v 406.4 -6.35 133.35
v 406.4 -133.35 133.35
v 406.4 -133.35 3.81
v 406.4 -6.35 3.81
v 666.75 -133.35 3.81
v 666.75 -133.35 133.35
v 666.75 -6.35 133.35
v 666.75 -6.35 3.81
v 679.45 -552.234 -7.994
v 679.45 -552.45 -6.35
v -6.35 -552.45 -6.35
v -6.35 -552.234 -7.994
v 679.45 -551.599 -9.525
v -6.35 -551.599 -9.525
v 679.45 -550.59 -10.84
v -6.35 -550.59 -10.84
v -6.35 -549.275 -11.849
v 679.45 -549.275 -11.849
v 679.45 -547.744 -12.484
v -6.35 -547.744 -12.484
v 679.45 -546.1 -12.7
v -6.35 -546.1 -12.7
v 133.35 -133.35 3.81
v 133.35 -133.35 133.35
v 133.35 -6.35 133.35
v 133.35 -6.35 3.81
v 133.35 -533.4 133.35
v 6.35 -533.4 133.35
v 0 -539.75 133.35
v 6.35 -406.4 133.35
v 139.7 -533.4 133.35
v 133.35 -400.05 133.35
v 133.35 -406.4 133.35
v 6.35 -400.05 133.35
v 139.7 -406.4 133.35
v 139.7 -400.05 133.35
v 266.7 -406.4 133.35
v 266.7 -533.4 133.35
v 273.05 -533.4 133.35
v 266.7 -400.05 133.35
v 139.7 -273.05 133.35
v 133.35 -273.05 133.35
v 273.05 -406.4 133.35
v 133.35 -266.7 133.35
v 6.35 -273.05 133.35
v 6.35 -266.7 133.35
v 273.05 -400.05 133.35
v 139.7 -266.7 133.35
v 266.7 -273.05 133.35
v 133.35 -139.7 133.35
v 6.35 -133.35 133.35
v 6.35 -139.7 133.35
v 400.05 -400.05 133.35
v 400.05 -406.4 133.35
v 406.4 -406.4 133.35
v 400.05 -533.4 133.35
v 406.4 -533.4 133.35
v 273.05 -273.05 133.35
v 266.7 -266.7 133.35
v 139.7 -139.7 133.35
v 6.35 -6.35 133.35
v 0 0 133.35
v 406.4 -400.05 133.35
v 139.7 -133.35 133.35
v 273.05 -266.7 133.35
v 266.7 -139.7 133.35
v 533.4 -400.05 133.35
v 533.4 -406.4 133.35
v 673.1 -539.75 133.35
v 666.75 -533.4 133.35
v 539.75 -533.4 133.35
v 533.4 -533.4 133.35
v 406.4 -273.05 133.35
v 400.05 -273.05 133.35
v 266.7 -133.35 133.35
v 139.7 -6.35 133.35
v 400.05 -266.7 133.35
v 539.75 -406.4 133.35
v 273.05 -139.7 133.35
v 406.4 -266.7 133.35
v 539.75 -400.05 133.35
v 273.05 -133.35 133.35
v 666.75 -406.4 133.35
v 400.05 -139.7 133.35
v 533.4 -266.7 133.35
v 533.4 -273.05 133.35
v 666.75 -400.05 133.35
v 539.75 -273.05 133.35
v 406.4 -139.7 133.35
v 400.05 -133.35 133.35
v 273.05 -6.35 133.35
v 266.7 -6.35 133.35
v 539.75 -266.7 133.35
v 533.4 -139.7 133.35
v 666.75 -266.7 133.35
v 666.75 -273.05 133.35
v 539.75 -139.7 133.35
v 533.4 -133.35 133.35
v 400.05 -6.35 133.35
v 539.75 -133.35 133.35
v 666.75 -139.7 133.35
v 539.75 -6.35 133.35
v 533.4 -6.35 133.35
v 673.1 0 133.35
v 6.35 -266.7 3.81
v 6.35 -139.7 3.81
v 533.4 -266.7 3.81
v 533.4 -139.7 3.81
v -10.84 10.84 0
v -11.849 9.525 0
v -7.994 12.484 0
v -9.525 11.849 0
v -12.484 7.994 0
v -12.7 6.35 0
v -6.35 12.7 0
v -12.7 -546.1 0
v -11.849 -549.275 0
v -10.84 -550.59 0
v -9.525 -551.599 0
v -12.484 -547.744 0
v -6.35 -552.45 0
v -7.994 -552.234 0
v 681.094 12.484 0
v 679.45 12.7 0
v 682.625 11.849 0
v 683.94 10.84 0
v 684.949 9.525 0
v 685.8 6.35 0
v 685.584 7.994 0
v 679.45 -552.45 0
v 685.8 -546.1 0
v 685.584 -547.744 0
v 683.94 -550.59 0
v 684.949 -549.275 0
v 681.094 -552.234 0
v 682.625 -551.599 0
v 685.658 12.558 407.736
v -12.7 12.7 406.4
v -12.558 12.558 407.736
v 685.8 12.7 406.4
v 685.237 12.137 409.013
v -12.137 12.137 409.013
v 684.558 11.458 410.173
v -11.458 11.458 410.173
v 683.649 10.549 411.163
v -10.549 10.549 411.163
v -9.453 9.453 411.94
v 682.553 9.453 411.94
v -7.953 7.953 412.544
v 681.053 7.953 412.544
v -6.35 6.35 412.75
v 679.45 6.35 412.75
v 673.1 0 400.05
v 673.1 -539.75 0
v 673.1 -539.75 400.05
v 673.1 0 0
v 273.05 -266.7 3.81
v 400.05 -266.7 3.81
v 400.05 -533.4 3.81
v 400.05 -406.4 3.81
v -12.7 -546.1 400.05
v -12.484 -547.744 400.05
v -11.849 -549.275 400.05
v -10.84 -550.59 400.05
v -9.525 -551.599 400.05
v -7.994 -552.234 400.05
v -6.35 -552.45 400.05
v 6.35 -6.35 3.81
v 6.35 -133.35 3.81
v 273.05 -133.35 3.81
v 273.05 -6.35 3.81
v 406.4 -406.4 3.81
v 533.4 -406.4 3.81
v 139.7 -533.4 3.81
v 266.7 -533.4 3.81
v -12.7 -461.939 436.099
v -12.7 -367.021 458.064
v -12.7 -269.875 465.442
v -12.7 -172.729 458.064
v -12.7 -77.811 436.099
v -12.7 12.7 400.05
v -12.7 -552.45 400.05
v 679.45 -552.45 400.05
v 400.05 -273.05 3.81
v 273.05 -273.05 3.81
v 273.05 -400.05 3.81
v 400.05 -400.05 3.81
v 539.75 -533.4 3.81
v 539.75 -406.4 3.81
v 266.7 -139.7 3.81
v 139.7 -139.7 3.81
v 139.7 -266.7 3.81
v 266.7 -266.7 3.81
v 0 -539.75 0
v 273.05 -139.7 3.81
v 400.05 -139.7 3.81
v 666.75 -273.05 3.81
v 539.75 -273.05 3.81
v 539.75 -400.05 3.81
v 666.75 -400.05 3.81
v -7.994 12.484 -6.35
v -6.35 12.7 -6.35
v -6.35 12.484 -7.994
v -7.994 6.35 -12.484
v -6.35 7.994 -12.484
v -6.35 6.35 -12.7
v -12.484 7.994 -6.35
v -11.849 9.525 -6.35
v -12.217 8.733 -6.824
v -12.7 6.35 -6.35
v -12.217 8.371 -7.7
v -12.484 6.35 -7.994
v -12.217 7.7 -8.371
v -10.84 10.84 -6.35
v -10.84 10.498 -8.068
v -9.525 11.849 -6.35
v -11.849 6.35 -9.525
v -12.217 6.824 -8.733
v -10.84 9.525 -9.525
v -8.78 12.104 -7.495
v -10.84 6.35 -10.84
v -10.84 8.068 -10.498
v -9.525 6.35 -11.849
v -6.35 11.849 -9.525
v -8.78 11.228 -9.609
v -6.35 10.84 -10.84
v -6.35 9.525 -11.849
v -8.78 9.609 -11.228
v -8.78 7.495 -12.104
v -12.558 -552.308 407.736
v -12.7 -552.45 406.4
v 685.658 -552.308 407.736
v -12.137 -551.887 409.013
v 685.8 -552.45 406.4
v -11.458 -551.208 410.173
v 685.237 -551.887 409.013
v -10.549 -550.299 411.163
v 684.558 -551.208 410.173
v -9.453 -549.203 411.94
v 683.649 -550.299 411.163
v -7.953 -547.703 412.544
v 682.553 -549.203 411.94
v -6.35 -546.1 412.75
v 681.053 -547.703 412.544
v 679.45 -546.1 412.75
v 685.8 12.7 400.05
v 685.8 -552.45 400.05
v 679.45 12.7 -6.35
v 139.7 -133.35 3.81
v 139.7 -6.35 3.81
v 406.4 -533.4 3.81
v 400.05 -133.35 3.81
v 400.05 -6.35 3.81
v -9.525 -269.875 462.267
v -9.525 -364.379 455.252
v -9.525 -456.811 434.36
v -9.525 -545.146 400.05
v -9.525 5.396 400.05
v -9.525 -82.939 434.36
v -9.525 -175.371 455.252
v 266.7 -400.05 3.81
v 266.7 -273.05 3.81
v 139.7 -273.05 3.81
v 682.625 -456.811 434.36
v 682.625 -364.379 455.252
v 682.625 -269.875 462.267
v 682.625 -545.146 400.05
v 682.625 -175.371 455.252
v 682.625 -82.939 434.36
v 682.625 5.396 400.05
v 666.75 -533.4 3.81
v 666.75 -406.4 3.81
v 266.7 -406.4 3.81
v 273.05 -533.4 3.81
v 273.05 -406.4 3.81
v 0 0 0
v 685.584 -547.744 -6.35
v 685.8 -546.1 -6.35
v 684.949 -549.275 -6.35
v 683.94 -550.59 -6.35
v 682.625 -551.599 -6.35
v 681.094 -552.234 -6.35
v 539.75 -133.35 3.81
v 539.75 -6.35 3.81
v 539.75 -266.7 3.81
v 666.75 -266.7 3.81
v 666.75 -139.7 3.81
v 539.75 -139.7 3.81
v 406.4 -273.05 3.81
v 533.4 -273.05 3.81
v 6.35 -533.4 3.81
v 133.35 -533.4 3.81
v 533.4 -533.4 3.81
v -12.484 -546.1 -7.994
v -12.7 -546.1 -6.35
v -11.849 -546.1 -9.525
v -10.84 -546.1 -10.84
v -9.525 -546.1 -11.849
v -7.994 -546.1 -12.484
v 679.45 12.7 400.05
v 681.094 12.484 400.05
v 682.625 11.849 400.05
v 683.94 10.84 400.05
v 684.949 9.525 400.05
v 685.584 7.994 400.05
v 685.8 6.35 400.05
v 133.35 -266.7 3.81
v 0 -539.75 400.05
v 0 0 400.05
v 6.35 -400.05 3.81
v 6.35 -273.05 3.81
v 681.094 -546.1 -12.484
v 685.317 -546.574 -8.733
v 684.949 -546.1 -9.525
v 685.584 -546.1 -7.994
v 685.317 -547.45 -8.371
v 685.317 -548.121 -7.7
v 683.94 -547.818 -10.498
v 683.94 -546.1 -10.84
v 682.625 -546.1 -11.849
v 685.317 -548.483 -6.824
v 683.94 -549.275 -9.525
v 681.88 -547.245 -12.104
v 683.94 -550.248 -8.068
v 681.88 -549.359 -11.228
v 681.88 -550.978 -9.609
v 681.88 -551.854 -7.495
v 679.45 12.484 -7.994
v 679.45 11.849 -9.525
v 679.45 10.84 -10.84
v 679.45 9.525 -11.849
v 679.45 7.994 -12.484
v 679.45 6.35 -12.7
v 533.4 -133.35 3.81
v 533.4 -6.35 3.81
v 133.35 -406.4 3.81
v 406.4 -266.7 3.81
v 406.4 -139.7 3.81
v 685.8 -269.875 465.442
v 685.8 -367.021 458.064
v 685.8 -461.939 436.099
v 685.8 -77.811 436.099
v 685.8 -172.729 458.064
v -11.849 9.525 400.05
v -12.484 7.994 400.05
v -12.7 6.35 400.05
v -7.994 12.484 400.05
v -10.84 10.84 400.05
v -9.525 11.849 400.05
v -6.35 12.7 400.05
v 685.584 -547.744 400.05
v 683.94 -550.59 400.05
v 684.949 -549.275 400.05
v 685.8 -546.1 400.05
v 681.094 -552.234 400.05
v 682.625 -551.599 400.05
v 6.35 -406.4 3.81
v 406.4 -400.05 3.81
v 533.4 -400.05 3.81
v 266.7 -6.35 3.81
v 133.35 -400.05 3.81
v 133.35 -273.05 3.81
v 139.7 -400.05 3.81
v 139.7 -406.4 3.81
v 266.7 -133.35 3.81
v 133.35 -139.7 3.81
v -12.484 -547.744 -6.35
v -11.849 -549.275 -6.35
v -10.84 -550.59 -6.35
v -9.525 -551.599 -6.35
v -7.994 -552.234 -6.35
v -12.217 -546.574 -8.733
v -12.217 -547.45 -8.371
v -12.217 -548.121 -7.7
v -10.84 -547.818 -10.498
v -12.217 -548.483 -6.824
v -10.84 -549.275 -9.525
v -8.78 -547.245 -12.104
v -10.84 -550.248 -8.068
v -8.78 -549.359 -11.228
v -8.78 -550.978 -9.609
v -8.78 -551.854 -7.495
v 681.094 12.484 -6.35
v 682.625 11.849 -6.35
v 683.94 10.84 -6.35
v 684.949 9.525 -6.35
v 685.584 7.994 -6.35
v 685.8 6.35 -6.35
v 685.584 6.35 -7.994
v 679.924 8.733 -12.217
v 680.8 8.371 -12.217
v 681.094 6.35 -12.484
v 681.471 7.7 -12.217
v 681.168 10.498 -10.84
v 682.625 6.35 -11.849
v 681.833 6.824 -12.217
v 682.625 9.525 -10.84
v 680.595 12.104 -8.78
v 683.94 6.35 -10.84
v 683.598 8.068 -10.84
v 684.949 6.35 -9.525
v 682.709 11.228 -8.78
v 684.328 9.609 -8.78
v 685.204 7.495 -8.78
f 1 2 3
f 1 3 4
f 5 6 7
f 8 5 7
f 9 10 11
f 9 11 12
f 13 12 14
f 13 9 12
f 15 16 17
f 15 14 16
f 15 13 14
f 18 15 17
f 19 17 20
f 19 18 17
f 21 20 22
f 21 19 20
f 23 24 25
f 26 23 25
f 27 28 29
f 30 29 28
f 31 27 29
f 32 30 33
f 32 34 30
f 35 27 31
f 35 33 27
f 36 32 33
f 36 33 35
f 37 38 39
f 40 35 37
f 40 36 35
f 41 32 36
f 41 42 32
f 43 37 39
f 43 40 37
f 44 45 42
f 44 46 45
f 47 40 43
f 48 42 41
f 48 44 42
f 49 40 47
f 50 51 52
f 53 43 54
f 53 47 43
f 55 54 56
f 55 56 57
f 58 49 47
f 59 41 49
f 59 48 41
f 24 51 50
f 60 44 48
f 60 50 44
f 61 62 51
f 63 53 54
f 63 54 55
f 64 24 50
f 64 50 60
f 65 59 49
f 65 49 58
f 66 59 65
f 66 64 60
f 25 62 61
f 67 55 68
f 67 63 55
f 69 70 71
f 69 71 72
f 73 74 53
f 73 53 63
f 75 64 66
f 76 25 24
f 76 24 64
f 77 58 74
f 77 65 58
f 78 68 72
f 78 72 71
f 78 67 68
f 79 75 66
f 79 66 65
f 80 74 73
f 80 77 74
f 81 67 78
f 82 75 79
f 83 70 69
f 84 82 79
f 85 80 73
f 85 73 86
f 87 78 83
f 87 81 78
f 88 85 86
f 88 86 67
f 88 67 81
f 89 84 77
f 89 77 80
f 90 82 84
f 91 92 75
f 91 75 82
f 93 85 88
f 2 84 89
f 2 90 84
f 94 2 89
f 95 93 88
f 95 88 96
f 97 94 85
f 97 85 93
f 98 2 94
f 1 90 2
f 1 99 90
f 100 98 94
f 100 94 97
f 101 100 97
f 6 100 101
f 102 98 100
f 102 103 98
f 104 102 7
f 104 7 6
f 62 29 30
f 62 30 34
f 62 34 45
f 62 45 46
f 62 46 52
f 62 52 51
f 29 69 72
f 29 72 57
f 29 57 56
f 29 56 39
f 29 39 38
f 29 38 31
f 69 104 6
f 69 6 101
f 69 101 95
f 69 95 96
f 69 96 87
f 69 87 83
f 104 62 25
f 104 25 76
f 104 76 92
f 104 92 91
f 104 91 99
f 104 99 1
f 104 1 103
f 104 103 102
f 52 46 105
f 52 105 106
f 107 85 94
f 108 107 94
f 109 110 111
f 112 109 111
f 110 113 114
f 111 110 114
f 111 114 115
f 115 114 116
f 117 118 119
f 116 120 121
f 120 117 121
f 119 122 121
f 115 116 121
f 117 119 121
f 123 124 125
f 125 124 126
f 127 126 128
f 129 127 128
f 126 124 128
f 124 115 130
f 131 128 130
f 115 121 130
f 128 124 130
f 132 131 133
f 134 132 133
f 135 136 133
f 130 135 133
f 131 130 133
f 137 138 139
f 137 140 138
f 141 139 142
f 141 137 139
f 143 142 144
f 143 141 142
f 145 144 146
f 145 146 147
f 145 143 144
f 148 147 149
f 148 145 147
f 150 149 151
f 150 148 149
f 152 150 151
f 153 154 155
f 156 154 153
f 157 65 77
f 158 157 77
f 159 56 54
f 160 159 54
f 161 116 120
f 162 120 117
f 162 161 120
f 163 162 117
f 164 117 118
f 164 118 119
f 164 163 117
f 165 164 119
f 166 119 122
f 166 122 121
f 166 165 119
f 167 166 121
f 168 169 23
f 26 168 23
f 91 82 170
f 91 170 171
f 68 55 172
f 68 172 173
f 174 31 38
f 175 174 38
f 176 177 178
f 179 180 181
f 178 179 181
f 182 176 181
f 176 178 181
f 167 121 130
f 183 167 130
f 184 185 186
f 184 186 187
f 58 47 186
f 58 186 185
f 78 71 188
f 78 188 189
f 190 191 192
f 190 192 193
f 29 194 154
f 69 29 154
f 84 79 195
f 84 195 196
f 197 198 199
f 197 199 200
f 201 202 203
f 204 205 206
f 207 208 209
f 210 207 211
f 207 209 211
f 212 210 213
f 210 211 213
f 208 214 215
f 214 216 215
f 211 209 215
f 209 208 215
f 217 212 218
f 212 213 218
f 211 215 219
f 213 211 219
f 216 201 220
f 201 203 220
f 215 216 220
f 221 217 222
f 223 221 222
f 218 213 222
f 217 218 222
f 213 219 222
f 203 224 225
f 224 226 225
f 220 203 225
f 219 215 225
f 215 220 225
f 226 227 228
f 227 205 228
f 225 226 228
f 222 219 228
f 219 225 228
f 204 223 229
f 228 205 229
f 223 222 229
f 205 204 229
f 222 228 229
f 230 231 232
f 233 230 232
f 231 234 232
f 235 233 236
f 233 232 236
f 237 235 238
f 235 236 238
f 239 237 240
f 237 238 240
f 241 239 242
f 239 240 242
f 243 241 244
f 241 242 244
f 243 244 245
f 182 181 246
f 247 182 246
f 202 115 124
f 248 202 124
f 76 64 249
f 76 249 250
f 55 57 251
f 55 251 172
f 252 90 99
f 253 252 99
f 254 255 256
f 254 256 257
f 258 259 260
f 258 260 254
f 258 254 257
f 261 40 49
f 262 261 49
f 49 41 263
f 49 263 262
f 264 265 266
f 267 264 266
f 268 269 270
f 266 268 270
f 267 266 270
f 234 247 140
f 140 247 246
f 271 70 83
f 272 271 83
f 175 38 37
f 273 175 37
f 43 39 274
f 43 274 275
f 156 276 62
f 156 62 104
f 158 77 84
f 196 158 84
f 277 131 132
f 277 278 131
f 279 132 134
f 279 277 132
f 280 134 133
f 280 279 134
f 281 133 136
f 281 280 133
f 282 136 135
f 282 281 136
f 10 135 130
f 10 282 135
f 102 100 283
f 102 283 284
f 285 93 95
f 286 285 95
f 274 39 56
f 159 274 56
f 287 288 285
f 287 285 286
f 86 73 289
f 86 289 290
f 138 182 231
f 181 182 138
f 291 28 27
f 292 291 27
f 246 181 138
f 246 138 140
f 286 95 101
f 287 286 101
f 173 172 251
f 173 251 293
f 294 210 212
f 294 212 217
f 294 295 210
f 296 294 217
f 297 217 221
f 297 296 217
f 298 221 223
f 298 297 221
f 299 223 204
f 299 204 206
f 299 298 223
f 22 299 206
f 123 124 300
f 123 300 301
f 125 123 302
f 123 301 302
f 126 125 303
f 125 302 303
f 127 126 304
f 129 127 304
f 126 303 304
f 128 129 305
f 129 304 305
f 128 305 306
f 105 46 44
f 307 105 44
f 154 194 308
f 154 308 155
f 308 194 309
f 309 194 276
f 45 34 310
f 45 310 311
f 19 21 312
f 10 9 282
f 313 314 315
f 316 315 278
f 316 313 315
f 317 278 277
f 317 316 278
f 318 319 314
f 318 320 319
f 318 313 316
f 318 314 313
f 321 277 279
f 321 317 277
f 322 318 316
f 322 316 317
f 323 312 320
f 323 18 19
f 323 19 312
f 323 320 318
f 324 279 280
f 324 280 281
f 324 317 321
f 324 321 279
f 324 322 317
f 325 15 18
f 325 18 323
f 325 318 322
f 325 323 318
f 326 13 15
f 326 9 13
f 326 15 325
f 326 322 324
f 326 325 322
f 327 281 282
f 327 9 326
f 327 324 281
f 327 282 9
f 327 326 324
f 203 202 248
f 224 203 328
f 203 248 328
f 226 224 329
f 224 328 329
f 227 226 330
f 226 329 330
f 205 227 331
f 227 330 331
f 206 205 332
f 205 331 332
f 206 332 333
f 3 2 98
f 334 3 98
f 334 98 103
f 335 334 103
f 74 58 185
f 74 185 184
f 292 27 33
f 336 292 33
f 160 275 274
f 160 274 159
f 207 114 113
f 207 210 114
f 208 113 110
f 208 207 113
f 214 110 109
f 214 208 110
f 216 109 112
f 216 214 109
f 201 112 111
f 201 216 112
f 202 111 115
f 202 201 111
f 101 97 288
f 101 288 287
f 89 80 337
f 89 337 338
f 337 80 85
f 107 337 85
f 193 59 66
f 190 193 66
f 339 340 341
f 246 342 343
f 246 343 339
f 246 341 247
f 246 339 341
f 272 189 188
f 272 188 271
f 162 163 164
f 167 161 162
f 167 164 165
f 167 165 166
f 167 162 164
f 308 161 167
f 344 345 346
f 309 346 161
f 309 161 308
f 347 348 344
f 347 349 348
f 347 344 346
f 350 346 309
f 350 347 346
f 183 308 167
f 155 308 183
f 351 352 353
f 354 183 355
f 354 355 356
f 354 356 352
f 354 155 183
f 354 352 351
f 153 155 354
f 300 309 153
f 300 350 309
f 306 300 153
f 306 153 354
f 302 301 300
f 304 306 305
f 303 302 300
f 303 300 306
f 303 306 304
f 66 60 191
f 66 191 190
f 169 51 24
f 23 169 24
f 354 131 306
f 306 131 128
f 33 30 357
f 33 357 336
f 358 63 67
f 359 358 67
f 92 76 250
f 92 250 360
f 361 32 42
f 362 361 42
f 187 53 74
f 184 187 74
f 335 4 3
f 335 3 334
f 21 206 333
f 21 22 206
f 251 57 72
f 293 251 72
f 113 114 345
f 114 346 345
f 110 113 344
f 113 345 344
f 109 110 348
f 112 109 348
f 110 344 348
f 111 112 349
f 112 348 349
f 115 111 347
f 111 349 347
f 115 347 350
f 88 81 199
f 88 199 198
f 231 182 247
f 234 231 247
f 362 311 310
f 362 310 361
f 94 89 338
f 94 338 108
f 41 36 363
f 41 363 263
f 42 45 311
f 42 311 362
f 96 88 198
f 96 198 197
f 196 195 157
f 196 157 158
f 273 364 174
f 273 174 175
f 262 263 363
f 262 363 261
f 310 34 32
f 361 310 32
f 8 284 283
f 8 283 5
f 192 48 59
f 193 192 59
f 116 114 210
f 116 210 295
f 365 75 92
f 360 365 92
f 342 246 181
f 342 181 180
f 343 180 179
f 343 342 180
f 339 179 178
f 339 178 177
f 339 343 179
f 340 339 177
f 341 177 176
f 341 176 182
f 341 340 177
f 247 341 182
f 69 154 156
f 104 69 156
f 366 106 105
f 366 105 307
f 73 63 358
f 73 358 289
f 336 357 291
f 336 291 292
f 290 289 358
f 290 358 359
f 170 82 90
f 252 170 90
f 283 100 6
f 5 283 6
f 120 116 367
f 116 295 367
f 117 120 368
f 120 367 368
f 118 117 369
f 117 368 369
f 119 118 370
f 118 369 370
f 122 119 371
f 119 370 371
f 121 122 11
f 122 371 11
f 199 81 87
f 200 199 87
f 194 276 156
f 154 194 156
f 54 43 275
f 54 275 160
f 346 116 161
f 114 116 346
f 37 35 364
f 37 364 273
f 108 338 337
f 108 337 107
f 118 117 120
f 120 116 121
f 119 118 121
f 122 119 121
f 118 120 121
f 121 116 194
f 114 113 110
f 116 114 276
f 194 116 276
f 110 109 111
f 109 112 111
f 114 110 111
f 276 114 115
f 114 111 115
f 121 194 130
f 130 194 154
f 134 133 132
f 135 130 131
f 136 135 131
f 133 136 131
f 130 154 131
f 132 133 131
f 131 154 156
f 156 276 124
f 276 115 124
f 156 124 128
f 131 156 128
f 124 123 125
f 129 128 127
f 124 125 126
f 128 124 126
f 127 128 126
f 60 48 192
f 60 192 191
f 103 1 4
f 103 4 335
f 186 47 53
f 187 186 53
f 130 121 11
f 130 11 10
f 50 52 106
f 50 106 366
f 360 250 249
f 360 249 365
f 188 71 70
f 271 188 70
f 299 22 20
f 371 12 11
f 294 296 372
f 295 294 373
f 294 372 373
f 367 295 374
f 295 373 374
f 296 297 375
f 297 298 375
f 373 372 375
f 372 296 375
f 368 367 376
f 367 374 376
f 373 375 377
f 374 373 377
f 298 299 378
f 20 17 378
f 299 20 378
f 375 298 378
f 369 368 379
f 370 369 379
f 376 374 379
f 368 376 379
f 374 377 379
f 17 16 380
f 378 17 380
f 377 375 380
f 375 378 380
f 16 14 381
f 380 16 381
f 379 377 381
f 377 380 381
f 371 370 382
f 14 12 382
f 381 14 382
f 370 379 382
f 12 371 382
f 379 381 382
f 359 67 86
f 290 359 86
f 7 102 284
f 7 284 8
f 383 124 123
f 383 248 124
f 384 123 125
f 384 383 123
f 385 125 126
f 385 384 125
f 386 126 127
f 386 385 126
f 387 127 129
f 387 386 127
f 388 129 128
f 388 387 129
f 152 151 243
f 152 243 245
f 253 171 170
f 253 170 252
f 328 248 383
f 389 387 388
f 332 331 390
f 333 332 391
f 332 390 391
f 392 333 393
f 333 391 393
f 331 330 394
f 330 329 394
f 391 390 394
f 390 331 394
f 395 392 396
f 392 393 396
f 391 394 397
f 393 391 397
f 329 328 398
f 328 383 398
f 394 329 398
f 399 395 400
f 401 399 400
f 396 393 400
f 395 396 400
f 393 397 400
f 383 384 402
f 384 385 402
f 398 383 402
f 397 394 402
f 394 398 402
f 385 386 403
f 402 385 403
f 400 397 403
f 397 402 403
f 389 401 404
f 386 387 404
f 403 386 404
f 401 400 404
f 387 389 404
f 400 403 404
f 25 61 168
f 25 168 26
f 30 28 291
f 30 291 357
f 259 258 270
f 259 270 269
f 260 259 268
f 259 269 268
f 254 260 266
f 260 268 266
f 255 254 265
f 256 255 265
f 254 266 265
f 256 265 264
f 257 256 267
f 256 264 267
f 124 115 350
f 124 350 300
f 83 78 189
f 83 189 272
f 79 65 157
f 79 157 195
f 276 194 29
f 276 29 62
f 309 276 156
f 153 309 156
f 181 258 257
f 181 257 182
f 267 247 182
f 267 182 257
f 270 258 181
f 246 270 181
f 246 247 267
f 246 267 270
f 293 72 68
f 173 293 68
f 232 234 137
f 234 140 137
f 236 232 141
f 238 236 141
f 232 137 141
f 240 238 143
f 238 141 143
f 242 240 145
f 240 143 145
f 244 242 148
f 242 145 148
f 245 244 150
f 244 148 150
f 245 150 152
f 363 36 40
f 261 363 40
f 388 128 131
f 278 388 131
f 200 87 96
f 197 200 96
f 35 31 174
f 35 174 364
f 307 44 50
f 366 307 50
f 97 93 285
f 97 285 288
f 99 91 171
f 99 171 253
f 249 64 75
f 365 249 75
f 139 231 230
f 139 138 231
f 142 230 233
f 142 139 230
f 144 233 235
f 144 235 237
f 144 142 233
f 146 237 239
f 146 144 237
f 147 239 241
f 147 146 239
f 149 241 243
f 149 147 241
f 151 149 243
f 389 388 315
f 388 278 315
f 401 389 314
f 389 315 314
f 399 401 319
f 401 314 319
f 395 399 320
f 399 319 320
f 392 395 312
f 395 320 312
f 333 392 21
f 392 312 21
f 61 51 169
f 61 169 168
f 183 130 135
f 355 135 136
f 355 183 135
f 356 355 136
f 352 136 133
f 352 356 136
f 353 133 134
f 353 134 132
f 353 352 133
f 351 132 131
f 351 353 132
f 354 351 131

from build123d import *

# Parameters (mm, degrees)
F1_W      = 673.1
F1_H      = 539.75
F2_DEPTH  = 133.35
F3_W      = 127
F3_H      = 127
F4_DEPTH  = 129.54
F5_W      = 698.5
F5_H      = 565.15
F6_DEPTH  = 12.7
F7_W      = 698.5
F7_H      = 565.15
F7_W_2    = 673.1
F7_H_2    = 539.75
F8_DEPTH  = 400.05
F9_W      = 698.5
F9_H      = 565.15
F10_DEPTH = 12.7
F11_R     = 6.35
F11_2_R   = 6.35
F11_3_R   = 6.35
F13_DEPTH = 698.5
F14_T     = -3.175


with BuildPart() as f2:
    # F1 (on Top) → F2 (new body)
    with BuildSketch(Plane.XY):
        with Locations((336.55, -269.875)):
            Rectangle(F1_W, F1_H)
    extrude(amount=F2_DEPTH)

    # F3 (on face) → F4 (cut)
    with BuildSketch(Plane.XY.offset(133.35)):
        with Locations((69.85, -203.2)):
            Rectangle(F3_W, F3_H)
        with Locations((336.55, -203.2)):
            Rectangle(F3_W, F3_H)
        with Locations((603.25, -469.9)):
            Rectangle(F3_W, F3_H)
        with Locations((203.2, -336.55)):
            Rectangle(F3_W, F3_H)
        with Locations((69.85, -469.9)):
            Rectangle(F3_W, F3_H)
        with Locations((69.85, -336.55)):
            Rectangle(F3_W, F3_H)
        with Locations((336.55, -69.85)):
            Rectangle(F3_W, F3_H)
        with Locations((203.2, -69.85)):
            Rectangle(F3_W, F3_H)
        with Locations((603.25, -69.85)):
            Rectangle(F3_W, F3_H)
        with Locations((603.25, -203.2)):
            Rectangle(F3_W, F3_H)
        with Locations((469.9, -336.55)):
            Rectangle(F3_W, F3_H)
        with Locations((603.25, -336.55)):
            Rectangle(F3_W, F3_H)
        with Locations((469.9, -203.2)):
            Rectangle(F3_W, F3_H)
        with Locations((336.55, -336.55)):
            Rectangle(F3_W, F3_H)
        with Locations((203.2, -469.9)):
            Rectangle(F3_W, F3_H)
        with Locations((203.2, -203.2)):
            Rectangle(F3_W, F3_H)
        with Locations((69.85, -69.85)):
            Rectangle(F3_W, F3_H)
        with Locations((336.55, -469.9)):
            Rectangle(F3_W, F3_H)
        with Locations((469.9, -469.9)):
            Rectangle(F3_W, F3_H)
        with Locations((469.9, -69.85)):
            Rectangle(F3_W, F3_H)
    extrude(amount=-F4_DEPTH, mode=Mode.SUBTRACT)


with BuildPart() as f6:
    # F5 (on face) → F6 (new body)
    with BuildSketch(Plane(origin=(0, 0, 0), x_dir=(1, 0, 0), z_dir=(0, 0, -1))):
        with Locations((336.55, 269.875)):
            Rectangle(F5_W, F5_H)
    extrude(amount=F6_DEPTH)

    # F11
    f11_edges = [f6.edges().sort_by_distance(p)[0] for p in [
        (685.8, 12.7, -6.35),
        (336.55, 12.7, -12.7),
        (-12.7, 12.7, -6.35),
        (336.55, -552.45, -12.7),
        (-12.7, -269.875, -12.7),
        (685.8, -269.875, -12.7),
        (685.8, -552.45, -6.35),
        (-12.7, -552.45, -6.35),
    ]]
    fillet(f11_edges, radius=F11_R)


with BuildPart() as f8:
    # F7 (on face) → F8 (new body)
    with BuildSketch(Plane.XY):
        with Locations((336.55, -269.875)):
            Rectangle(F7_W, F7_H)
        with Locations((336.55, -269.875)):
            Rectangle(F7_W_2, F7_H_2, mode=Mode.SUBTRACT)
    extrude(amount=F8_DEPTH)

    # F11#2
    f11_2_edges = [f8.edges().sort_by_distance(p)[0] for p in [
        (685.8, 12.7, 200.025),
        (-12.7, 12.7, 200.025),
        (685.8, -552.45, 200.025),
        (-12.7, -552.45, 200.025),
    ]]
    fillet(f11_2_edges, radius=F11_2_R)


with BuildPart() as f10:
    # F9 (on face) → F10 (new body)
    with BuildSketch(Plane.XY.offset(400.05)):
        with Locations((336.55, -269.875)):
            Rectangle(F9_W, F9_H)
    extrude(amount=F10_DEPTH)

    # F11#3
    f11_3_edges = [f10.edges().sort_by_distance(p)[0] for p in [
        (336.55, 12.7, 412.75),
        (-12.7, -269.875, 412.75),
        (336.55, -552.45, 412.75),
        (685.8, -269.875, 412.75),
    ]]
    fillet(f11_3_edges, radius=F11_3_R)


with BuildPart() as f13:
    # F12 (on face) → F13 (new body, through all)
    with BuildSketch(Plane.YZ.offset(685.8)):
        with BuildLine():
            Line((-552.45, 400.05), (12.7, 400.05))
            ThreePointArc((12.7, 400.05), (-269.875, 465.4420942253), (-552.45, 400.05))
        make_face()
    extrude(amount=-F13_DEPTH)

    # F14
    f14_openings = [f13.faces().sort_by_distance(p)[0] for p in [
        (336.55, -269.875, 400.05),
    ]]
    offset(amount=F14_T, openings=f14_openings)


solid = Compound([f2.part, f6.part, f8.part, f10.part, f13.part])
